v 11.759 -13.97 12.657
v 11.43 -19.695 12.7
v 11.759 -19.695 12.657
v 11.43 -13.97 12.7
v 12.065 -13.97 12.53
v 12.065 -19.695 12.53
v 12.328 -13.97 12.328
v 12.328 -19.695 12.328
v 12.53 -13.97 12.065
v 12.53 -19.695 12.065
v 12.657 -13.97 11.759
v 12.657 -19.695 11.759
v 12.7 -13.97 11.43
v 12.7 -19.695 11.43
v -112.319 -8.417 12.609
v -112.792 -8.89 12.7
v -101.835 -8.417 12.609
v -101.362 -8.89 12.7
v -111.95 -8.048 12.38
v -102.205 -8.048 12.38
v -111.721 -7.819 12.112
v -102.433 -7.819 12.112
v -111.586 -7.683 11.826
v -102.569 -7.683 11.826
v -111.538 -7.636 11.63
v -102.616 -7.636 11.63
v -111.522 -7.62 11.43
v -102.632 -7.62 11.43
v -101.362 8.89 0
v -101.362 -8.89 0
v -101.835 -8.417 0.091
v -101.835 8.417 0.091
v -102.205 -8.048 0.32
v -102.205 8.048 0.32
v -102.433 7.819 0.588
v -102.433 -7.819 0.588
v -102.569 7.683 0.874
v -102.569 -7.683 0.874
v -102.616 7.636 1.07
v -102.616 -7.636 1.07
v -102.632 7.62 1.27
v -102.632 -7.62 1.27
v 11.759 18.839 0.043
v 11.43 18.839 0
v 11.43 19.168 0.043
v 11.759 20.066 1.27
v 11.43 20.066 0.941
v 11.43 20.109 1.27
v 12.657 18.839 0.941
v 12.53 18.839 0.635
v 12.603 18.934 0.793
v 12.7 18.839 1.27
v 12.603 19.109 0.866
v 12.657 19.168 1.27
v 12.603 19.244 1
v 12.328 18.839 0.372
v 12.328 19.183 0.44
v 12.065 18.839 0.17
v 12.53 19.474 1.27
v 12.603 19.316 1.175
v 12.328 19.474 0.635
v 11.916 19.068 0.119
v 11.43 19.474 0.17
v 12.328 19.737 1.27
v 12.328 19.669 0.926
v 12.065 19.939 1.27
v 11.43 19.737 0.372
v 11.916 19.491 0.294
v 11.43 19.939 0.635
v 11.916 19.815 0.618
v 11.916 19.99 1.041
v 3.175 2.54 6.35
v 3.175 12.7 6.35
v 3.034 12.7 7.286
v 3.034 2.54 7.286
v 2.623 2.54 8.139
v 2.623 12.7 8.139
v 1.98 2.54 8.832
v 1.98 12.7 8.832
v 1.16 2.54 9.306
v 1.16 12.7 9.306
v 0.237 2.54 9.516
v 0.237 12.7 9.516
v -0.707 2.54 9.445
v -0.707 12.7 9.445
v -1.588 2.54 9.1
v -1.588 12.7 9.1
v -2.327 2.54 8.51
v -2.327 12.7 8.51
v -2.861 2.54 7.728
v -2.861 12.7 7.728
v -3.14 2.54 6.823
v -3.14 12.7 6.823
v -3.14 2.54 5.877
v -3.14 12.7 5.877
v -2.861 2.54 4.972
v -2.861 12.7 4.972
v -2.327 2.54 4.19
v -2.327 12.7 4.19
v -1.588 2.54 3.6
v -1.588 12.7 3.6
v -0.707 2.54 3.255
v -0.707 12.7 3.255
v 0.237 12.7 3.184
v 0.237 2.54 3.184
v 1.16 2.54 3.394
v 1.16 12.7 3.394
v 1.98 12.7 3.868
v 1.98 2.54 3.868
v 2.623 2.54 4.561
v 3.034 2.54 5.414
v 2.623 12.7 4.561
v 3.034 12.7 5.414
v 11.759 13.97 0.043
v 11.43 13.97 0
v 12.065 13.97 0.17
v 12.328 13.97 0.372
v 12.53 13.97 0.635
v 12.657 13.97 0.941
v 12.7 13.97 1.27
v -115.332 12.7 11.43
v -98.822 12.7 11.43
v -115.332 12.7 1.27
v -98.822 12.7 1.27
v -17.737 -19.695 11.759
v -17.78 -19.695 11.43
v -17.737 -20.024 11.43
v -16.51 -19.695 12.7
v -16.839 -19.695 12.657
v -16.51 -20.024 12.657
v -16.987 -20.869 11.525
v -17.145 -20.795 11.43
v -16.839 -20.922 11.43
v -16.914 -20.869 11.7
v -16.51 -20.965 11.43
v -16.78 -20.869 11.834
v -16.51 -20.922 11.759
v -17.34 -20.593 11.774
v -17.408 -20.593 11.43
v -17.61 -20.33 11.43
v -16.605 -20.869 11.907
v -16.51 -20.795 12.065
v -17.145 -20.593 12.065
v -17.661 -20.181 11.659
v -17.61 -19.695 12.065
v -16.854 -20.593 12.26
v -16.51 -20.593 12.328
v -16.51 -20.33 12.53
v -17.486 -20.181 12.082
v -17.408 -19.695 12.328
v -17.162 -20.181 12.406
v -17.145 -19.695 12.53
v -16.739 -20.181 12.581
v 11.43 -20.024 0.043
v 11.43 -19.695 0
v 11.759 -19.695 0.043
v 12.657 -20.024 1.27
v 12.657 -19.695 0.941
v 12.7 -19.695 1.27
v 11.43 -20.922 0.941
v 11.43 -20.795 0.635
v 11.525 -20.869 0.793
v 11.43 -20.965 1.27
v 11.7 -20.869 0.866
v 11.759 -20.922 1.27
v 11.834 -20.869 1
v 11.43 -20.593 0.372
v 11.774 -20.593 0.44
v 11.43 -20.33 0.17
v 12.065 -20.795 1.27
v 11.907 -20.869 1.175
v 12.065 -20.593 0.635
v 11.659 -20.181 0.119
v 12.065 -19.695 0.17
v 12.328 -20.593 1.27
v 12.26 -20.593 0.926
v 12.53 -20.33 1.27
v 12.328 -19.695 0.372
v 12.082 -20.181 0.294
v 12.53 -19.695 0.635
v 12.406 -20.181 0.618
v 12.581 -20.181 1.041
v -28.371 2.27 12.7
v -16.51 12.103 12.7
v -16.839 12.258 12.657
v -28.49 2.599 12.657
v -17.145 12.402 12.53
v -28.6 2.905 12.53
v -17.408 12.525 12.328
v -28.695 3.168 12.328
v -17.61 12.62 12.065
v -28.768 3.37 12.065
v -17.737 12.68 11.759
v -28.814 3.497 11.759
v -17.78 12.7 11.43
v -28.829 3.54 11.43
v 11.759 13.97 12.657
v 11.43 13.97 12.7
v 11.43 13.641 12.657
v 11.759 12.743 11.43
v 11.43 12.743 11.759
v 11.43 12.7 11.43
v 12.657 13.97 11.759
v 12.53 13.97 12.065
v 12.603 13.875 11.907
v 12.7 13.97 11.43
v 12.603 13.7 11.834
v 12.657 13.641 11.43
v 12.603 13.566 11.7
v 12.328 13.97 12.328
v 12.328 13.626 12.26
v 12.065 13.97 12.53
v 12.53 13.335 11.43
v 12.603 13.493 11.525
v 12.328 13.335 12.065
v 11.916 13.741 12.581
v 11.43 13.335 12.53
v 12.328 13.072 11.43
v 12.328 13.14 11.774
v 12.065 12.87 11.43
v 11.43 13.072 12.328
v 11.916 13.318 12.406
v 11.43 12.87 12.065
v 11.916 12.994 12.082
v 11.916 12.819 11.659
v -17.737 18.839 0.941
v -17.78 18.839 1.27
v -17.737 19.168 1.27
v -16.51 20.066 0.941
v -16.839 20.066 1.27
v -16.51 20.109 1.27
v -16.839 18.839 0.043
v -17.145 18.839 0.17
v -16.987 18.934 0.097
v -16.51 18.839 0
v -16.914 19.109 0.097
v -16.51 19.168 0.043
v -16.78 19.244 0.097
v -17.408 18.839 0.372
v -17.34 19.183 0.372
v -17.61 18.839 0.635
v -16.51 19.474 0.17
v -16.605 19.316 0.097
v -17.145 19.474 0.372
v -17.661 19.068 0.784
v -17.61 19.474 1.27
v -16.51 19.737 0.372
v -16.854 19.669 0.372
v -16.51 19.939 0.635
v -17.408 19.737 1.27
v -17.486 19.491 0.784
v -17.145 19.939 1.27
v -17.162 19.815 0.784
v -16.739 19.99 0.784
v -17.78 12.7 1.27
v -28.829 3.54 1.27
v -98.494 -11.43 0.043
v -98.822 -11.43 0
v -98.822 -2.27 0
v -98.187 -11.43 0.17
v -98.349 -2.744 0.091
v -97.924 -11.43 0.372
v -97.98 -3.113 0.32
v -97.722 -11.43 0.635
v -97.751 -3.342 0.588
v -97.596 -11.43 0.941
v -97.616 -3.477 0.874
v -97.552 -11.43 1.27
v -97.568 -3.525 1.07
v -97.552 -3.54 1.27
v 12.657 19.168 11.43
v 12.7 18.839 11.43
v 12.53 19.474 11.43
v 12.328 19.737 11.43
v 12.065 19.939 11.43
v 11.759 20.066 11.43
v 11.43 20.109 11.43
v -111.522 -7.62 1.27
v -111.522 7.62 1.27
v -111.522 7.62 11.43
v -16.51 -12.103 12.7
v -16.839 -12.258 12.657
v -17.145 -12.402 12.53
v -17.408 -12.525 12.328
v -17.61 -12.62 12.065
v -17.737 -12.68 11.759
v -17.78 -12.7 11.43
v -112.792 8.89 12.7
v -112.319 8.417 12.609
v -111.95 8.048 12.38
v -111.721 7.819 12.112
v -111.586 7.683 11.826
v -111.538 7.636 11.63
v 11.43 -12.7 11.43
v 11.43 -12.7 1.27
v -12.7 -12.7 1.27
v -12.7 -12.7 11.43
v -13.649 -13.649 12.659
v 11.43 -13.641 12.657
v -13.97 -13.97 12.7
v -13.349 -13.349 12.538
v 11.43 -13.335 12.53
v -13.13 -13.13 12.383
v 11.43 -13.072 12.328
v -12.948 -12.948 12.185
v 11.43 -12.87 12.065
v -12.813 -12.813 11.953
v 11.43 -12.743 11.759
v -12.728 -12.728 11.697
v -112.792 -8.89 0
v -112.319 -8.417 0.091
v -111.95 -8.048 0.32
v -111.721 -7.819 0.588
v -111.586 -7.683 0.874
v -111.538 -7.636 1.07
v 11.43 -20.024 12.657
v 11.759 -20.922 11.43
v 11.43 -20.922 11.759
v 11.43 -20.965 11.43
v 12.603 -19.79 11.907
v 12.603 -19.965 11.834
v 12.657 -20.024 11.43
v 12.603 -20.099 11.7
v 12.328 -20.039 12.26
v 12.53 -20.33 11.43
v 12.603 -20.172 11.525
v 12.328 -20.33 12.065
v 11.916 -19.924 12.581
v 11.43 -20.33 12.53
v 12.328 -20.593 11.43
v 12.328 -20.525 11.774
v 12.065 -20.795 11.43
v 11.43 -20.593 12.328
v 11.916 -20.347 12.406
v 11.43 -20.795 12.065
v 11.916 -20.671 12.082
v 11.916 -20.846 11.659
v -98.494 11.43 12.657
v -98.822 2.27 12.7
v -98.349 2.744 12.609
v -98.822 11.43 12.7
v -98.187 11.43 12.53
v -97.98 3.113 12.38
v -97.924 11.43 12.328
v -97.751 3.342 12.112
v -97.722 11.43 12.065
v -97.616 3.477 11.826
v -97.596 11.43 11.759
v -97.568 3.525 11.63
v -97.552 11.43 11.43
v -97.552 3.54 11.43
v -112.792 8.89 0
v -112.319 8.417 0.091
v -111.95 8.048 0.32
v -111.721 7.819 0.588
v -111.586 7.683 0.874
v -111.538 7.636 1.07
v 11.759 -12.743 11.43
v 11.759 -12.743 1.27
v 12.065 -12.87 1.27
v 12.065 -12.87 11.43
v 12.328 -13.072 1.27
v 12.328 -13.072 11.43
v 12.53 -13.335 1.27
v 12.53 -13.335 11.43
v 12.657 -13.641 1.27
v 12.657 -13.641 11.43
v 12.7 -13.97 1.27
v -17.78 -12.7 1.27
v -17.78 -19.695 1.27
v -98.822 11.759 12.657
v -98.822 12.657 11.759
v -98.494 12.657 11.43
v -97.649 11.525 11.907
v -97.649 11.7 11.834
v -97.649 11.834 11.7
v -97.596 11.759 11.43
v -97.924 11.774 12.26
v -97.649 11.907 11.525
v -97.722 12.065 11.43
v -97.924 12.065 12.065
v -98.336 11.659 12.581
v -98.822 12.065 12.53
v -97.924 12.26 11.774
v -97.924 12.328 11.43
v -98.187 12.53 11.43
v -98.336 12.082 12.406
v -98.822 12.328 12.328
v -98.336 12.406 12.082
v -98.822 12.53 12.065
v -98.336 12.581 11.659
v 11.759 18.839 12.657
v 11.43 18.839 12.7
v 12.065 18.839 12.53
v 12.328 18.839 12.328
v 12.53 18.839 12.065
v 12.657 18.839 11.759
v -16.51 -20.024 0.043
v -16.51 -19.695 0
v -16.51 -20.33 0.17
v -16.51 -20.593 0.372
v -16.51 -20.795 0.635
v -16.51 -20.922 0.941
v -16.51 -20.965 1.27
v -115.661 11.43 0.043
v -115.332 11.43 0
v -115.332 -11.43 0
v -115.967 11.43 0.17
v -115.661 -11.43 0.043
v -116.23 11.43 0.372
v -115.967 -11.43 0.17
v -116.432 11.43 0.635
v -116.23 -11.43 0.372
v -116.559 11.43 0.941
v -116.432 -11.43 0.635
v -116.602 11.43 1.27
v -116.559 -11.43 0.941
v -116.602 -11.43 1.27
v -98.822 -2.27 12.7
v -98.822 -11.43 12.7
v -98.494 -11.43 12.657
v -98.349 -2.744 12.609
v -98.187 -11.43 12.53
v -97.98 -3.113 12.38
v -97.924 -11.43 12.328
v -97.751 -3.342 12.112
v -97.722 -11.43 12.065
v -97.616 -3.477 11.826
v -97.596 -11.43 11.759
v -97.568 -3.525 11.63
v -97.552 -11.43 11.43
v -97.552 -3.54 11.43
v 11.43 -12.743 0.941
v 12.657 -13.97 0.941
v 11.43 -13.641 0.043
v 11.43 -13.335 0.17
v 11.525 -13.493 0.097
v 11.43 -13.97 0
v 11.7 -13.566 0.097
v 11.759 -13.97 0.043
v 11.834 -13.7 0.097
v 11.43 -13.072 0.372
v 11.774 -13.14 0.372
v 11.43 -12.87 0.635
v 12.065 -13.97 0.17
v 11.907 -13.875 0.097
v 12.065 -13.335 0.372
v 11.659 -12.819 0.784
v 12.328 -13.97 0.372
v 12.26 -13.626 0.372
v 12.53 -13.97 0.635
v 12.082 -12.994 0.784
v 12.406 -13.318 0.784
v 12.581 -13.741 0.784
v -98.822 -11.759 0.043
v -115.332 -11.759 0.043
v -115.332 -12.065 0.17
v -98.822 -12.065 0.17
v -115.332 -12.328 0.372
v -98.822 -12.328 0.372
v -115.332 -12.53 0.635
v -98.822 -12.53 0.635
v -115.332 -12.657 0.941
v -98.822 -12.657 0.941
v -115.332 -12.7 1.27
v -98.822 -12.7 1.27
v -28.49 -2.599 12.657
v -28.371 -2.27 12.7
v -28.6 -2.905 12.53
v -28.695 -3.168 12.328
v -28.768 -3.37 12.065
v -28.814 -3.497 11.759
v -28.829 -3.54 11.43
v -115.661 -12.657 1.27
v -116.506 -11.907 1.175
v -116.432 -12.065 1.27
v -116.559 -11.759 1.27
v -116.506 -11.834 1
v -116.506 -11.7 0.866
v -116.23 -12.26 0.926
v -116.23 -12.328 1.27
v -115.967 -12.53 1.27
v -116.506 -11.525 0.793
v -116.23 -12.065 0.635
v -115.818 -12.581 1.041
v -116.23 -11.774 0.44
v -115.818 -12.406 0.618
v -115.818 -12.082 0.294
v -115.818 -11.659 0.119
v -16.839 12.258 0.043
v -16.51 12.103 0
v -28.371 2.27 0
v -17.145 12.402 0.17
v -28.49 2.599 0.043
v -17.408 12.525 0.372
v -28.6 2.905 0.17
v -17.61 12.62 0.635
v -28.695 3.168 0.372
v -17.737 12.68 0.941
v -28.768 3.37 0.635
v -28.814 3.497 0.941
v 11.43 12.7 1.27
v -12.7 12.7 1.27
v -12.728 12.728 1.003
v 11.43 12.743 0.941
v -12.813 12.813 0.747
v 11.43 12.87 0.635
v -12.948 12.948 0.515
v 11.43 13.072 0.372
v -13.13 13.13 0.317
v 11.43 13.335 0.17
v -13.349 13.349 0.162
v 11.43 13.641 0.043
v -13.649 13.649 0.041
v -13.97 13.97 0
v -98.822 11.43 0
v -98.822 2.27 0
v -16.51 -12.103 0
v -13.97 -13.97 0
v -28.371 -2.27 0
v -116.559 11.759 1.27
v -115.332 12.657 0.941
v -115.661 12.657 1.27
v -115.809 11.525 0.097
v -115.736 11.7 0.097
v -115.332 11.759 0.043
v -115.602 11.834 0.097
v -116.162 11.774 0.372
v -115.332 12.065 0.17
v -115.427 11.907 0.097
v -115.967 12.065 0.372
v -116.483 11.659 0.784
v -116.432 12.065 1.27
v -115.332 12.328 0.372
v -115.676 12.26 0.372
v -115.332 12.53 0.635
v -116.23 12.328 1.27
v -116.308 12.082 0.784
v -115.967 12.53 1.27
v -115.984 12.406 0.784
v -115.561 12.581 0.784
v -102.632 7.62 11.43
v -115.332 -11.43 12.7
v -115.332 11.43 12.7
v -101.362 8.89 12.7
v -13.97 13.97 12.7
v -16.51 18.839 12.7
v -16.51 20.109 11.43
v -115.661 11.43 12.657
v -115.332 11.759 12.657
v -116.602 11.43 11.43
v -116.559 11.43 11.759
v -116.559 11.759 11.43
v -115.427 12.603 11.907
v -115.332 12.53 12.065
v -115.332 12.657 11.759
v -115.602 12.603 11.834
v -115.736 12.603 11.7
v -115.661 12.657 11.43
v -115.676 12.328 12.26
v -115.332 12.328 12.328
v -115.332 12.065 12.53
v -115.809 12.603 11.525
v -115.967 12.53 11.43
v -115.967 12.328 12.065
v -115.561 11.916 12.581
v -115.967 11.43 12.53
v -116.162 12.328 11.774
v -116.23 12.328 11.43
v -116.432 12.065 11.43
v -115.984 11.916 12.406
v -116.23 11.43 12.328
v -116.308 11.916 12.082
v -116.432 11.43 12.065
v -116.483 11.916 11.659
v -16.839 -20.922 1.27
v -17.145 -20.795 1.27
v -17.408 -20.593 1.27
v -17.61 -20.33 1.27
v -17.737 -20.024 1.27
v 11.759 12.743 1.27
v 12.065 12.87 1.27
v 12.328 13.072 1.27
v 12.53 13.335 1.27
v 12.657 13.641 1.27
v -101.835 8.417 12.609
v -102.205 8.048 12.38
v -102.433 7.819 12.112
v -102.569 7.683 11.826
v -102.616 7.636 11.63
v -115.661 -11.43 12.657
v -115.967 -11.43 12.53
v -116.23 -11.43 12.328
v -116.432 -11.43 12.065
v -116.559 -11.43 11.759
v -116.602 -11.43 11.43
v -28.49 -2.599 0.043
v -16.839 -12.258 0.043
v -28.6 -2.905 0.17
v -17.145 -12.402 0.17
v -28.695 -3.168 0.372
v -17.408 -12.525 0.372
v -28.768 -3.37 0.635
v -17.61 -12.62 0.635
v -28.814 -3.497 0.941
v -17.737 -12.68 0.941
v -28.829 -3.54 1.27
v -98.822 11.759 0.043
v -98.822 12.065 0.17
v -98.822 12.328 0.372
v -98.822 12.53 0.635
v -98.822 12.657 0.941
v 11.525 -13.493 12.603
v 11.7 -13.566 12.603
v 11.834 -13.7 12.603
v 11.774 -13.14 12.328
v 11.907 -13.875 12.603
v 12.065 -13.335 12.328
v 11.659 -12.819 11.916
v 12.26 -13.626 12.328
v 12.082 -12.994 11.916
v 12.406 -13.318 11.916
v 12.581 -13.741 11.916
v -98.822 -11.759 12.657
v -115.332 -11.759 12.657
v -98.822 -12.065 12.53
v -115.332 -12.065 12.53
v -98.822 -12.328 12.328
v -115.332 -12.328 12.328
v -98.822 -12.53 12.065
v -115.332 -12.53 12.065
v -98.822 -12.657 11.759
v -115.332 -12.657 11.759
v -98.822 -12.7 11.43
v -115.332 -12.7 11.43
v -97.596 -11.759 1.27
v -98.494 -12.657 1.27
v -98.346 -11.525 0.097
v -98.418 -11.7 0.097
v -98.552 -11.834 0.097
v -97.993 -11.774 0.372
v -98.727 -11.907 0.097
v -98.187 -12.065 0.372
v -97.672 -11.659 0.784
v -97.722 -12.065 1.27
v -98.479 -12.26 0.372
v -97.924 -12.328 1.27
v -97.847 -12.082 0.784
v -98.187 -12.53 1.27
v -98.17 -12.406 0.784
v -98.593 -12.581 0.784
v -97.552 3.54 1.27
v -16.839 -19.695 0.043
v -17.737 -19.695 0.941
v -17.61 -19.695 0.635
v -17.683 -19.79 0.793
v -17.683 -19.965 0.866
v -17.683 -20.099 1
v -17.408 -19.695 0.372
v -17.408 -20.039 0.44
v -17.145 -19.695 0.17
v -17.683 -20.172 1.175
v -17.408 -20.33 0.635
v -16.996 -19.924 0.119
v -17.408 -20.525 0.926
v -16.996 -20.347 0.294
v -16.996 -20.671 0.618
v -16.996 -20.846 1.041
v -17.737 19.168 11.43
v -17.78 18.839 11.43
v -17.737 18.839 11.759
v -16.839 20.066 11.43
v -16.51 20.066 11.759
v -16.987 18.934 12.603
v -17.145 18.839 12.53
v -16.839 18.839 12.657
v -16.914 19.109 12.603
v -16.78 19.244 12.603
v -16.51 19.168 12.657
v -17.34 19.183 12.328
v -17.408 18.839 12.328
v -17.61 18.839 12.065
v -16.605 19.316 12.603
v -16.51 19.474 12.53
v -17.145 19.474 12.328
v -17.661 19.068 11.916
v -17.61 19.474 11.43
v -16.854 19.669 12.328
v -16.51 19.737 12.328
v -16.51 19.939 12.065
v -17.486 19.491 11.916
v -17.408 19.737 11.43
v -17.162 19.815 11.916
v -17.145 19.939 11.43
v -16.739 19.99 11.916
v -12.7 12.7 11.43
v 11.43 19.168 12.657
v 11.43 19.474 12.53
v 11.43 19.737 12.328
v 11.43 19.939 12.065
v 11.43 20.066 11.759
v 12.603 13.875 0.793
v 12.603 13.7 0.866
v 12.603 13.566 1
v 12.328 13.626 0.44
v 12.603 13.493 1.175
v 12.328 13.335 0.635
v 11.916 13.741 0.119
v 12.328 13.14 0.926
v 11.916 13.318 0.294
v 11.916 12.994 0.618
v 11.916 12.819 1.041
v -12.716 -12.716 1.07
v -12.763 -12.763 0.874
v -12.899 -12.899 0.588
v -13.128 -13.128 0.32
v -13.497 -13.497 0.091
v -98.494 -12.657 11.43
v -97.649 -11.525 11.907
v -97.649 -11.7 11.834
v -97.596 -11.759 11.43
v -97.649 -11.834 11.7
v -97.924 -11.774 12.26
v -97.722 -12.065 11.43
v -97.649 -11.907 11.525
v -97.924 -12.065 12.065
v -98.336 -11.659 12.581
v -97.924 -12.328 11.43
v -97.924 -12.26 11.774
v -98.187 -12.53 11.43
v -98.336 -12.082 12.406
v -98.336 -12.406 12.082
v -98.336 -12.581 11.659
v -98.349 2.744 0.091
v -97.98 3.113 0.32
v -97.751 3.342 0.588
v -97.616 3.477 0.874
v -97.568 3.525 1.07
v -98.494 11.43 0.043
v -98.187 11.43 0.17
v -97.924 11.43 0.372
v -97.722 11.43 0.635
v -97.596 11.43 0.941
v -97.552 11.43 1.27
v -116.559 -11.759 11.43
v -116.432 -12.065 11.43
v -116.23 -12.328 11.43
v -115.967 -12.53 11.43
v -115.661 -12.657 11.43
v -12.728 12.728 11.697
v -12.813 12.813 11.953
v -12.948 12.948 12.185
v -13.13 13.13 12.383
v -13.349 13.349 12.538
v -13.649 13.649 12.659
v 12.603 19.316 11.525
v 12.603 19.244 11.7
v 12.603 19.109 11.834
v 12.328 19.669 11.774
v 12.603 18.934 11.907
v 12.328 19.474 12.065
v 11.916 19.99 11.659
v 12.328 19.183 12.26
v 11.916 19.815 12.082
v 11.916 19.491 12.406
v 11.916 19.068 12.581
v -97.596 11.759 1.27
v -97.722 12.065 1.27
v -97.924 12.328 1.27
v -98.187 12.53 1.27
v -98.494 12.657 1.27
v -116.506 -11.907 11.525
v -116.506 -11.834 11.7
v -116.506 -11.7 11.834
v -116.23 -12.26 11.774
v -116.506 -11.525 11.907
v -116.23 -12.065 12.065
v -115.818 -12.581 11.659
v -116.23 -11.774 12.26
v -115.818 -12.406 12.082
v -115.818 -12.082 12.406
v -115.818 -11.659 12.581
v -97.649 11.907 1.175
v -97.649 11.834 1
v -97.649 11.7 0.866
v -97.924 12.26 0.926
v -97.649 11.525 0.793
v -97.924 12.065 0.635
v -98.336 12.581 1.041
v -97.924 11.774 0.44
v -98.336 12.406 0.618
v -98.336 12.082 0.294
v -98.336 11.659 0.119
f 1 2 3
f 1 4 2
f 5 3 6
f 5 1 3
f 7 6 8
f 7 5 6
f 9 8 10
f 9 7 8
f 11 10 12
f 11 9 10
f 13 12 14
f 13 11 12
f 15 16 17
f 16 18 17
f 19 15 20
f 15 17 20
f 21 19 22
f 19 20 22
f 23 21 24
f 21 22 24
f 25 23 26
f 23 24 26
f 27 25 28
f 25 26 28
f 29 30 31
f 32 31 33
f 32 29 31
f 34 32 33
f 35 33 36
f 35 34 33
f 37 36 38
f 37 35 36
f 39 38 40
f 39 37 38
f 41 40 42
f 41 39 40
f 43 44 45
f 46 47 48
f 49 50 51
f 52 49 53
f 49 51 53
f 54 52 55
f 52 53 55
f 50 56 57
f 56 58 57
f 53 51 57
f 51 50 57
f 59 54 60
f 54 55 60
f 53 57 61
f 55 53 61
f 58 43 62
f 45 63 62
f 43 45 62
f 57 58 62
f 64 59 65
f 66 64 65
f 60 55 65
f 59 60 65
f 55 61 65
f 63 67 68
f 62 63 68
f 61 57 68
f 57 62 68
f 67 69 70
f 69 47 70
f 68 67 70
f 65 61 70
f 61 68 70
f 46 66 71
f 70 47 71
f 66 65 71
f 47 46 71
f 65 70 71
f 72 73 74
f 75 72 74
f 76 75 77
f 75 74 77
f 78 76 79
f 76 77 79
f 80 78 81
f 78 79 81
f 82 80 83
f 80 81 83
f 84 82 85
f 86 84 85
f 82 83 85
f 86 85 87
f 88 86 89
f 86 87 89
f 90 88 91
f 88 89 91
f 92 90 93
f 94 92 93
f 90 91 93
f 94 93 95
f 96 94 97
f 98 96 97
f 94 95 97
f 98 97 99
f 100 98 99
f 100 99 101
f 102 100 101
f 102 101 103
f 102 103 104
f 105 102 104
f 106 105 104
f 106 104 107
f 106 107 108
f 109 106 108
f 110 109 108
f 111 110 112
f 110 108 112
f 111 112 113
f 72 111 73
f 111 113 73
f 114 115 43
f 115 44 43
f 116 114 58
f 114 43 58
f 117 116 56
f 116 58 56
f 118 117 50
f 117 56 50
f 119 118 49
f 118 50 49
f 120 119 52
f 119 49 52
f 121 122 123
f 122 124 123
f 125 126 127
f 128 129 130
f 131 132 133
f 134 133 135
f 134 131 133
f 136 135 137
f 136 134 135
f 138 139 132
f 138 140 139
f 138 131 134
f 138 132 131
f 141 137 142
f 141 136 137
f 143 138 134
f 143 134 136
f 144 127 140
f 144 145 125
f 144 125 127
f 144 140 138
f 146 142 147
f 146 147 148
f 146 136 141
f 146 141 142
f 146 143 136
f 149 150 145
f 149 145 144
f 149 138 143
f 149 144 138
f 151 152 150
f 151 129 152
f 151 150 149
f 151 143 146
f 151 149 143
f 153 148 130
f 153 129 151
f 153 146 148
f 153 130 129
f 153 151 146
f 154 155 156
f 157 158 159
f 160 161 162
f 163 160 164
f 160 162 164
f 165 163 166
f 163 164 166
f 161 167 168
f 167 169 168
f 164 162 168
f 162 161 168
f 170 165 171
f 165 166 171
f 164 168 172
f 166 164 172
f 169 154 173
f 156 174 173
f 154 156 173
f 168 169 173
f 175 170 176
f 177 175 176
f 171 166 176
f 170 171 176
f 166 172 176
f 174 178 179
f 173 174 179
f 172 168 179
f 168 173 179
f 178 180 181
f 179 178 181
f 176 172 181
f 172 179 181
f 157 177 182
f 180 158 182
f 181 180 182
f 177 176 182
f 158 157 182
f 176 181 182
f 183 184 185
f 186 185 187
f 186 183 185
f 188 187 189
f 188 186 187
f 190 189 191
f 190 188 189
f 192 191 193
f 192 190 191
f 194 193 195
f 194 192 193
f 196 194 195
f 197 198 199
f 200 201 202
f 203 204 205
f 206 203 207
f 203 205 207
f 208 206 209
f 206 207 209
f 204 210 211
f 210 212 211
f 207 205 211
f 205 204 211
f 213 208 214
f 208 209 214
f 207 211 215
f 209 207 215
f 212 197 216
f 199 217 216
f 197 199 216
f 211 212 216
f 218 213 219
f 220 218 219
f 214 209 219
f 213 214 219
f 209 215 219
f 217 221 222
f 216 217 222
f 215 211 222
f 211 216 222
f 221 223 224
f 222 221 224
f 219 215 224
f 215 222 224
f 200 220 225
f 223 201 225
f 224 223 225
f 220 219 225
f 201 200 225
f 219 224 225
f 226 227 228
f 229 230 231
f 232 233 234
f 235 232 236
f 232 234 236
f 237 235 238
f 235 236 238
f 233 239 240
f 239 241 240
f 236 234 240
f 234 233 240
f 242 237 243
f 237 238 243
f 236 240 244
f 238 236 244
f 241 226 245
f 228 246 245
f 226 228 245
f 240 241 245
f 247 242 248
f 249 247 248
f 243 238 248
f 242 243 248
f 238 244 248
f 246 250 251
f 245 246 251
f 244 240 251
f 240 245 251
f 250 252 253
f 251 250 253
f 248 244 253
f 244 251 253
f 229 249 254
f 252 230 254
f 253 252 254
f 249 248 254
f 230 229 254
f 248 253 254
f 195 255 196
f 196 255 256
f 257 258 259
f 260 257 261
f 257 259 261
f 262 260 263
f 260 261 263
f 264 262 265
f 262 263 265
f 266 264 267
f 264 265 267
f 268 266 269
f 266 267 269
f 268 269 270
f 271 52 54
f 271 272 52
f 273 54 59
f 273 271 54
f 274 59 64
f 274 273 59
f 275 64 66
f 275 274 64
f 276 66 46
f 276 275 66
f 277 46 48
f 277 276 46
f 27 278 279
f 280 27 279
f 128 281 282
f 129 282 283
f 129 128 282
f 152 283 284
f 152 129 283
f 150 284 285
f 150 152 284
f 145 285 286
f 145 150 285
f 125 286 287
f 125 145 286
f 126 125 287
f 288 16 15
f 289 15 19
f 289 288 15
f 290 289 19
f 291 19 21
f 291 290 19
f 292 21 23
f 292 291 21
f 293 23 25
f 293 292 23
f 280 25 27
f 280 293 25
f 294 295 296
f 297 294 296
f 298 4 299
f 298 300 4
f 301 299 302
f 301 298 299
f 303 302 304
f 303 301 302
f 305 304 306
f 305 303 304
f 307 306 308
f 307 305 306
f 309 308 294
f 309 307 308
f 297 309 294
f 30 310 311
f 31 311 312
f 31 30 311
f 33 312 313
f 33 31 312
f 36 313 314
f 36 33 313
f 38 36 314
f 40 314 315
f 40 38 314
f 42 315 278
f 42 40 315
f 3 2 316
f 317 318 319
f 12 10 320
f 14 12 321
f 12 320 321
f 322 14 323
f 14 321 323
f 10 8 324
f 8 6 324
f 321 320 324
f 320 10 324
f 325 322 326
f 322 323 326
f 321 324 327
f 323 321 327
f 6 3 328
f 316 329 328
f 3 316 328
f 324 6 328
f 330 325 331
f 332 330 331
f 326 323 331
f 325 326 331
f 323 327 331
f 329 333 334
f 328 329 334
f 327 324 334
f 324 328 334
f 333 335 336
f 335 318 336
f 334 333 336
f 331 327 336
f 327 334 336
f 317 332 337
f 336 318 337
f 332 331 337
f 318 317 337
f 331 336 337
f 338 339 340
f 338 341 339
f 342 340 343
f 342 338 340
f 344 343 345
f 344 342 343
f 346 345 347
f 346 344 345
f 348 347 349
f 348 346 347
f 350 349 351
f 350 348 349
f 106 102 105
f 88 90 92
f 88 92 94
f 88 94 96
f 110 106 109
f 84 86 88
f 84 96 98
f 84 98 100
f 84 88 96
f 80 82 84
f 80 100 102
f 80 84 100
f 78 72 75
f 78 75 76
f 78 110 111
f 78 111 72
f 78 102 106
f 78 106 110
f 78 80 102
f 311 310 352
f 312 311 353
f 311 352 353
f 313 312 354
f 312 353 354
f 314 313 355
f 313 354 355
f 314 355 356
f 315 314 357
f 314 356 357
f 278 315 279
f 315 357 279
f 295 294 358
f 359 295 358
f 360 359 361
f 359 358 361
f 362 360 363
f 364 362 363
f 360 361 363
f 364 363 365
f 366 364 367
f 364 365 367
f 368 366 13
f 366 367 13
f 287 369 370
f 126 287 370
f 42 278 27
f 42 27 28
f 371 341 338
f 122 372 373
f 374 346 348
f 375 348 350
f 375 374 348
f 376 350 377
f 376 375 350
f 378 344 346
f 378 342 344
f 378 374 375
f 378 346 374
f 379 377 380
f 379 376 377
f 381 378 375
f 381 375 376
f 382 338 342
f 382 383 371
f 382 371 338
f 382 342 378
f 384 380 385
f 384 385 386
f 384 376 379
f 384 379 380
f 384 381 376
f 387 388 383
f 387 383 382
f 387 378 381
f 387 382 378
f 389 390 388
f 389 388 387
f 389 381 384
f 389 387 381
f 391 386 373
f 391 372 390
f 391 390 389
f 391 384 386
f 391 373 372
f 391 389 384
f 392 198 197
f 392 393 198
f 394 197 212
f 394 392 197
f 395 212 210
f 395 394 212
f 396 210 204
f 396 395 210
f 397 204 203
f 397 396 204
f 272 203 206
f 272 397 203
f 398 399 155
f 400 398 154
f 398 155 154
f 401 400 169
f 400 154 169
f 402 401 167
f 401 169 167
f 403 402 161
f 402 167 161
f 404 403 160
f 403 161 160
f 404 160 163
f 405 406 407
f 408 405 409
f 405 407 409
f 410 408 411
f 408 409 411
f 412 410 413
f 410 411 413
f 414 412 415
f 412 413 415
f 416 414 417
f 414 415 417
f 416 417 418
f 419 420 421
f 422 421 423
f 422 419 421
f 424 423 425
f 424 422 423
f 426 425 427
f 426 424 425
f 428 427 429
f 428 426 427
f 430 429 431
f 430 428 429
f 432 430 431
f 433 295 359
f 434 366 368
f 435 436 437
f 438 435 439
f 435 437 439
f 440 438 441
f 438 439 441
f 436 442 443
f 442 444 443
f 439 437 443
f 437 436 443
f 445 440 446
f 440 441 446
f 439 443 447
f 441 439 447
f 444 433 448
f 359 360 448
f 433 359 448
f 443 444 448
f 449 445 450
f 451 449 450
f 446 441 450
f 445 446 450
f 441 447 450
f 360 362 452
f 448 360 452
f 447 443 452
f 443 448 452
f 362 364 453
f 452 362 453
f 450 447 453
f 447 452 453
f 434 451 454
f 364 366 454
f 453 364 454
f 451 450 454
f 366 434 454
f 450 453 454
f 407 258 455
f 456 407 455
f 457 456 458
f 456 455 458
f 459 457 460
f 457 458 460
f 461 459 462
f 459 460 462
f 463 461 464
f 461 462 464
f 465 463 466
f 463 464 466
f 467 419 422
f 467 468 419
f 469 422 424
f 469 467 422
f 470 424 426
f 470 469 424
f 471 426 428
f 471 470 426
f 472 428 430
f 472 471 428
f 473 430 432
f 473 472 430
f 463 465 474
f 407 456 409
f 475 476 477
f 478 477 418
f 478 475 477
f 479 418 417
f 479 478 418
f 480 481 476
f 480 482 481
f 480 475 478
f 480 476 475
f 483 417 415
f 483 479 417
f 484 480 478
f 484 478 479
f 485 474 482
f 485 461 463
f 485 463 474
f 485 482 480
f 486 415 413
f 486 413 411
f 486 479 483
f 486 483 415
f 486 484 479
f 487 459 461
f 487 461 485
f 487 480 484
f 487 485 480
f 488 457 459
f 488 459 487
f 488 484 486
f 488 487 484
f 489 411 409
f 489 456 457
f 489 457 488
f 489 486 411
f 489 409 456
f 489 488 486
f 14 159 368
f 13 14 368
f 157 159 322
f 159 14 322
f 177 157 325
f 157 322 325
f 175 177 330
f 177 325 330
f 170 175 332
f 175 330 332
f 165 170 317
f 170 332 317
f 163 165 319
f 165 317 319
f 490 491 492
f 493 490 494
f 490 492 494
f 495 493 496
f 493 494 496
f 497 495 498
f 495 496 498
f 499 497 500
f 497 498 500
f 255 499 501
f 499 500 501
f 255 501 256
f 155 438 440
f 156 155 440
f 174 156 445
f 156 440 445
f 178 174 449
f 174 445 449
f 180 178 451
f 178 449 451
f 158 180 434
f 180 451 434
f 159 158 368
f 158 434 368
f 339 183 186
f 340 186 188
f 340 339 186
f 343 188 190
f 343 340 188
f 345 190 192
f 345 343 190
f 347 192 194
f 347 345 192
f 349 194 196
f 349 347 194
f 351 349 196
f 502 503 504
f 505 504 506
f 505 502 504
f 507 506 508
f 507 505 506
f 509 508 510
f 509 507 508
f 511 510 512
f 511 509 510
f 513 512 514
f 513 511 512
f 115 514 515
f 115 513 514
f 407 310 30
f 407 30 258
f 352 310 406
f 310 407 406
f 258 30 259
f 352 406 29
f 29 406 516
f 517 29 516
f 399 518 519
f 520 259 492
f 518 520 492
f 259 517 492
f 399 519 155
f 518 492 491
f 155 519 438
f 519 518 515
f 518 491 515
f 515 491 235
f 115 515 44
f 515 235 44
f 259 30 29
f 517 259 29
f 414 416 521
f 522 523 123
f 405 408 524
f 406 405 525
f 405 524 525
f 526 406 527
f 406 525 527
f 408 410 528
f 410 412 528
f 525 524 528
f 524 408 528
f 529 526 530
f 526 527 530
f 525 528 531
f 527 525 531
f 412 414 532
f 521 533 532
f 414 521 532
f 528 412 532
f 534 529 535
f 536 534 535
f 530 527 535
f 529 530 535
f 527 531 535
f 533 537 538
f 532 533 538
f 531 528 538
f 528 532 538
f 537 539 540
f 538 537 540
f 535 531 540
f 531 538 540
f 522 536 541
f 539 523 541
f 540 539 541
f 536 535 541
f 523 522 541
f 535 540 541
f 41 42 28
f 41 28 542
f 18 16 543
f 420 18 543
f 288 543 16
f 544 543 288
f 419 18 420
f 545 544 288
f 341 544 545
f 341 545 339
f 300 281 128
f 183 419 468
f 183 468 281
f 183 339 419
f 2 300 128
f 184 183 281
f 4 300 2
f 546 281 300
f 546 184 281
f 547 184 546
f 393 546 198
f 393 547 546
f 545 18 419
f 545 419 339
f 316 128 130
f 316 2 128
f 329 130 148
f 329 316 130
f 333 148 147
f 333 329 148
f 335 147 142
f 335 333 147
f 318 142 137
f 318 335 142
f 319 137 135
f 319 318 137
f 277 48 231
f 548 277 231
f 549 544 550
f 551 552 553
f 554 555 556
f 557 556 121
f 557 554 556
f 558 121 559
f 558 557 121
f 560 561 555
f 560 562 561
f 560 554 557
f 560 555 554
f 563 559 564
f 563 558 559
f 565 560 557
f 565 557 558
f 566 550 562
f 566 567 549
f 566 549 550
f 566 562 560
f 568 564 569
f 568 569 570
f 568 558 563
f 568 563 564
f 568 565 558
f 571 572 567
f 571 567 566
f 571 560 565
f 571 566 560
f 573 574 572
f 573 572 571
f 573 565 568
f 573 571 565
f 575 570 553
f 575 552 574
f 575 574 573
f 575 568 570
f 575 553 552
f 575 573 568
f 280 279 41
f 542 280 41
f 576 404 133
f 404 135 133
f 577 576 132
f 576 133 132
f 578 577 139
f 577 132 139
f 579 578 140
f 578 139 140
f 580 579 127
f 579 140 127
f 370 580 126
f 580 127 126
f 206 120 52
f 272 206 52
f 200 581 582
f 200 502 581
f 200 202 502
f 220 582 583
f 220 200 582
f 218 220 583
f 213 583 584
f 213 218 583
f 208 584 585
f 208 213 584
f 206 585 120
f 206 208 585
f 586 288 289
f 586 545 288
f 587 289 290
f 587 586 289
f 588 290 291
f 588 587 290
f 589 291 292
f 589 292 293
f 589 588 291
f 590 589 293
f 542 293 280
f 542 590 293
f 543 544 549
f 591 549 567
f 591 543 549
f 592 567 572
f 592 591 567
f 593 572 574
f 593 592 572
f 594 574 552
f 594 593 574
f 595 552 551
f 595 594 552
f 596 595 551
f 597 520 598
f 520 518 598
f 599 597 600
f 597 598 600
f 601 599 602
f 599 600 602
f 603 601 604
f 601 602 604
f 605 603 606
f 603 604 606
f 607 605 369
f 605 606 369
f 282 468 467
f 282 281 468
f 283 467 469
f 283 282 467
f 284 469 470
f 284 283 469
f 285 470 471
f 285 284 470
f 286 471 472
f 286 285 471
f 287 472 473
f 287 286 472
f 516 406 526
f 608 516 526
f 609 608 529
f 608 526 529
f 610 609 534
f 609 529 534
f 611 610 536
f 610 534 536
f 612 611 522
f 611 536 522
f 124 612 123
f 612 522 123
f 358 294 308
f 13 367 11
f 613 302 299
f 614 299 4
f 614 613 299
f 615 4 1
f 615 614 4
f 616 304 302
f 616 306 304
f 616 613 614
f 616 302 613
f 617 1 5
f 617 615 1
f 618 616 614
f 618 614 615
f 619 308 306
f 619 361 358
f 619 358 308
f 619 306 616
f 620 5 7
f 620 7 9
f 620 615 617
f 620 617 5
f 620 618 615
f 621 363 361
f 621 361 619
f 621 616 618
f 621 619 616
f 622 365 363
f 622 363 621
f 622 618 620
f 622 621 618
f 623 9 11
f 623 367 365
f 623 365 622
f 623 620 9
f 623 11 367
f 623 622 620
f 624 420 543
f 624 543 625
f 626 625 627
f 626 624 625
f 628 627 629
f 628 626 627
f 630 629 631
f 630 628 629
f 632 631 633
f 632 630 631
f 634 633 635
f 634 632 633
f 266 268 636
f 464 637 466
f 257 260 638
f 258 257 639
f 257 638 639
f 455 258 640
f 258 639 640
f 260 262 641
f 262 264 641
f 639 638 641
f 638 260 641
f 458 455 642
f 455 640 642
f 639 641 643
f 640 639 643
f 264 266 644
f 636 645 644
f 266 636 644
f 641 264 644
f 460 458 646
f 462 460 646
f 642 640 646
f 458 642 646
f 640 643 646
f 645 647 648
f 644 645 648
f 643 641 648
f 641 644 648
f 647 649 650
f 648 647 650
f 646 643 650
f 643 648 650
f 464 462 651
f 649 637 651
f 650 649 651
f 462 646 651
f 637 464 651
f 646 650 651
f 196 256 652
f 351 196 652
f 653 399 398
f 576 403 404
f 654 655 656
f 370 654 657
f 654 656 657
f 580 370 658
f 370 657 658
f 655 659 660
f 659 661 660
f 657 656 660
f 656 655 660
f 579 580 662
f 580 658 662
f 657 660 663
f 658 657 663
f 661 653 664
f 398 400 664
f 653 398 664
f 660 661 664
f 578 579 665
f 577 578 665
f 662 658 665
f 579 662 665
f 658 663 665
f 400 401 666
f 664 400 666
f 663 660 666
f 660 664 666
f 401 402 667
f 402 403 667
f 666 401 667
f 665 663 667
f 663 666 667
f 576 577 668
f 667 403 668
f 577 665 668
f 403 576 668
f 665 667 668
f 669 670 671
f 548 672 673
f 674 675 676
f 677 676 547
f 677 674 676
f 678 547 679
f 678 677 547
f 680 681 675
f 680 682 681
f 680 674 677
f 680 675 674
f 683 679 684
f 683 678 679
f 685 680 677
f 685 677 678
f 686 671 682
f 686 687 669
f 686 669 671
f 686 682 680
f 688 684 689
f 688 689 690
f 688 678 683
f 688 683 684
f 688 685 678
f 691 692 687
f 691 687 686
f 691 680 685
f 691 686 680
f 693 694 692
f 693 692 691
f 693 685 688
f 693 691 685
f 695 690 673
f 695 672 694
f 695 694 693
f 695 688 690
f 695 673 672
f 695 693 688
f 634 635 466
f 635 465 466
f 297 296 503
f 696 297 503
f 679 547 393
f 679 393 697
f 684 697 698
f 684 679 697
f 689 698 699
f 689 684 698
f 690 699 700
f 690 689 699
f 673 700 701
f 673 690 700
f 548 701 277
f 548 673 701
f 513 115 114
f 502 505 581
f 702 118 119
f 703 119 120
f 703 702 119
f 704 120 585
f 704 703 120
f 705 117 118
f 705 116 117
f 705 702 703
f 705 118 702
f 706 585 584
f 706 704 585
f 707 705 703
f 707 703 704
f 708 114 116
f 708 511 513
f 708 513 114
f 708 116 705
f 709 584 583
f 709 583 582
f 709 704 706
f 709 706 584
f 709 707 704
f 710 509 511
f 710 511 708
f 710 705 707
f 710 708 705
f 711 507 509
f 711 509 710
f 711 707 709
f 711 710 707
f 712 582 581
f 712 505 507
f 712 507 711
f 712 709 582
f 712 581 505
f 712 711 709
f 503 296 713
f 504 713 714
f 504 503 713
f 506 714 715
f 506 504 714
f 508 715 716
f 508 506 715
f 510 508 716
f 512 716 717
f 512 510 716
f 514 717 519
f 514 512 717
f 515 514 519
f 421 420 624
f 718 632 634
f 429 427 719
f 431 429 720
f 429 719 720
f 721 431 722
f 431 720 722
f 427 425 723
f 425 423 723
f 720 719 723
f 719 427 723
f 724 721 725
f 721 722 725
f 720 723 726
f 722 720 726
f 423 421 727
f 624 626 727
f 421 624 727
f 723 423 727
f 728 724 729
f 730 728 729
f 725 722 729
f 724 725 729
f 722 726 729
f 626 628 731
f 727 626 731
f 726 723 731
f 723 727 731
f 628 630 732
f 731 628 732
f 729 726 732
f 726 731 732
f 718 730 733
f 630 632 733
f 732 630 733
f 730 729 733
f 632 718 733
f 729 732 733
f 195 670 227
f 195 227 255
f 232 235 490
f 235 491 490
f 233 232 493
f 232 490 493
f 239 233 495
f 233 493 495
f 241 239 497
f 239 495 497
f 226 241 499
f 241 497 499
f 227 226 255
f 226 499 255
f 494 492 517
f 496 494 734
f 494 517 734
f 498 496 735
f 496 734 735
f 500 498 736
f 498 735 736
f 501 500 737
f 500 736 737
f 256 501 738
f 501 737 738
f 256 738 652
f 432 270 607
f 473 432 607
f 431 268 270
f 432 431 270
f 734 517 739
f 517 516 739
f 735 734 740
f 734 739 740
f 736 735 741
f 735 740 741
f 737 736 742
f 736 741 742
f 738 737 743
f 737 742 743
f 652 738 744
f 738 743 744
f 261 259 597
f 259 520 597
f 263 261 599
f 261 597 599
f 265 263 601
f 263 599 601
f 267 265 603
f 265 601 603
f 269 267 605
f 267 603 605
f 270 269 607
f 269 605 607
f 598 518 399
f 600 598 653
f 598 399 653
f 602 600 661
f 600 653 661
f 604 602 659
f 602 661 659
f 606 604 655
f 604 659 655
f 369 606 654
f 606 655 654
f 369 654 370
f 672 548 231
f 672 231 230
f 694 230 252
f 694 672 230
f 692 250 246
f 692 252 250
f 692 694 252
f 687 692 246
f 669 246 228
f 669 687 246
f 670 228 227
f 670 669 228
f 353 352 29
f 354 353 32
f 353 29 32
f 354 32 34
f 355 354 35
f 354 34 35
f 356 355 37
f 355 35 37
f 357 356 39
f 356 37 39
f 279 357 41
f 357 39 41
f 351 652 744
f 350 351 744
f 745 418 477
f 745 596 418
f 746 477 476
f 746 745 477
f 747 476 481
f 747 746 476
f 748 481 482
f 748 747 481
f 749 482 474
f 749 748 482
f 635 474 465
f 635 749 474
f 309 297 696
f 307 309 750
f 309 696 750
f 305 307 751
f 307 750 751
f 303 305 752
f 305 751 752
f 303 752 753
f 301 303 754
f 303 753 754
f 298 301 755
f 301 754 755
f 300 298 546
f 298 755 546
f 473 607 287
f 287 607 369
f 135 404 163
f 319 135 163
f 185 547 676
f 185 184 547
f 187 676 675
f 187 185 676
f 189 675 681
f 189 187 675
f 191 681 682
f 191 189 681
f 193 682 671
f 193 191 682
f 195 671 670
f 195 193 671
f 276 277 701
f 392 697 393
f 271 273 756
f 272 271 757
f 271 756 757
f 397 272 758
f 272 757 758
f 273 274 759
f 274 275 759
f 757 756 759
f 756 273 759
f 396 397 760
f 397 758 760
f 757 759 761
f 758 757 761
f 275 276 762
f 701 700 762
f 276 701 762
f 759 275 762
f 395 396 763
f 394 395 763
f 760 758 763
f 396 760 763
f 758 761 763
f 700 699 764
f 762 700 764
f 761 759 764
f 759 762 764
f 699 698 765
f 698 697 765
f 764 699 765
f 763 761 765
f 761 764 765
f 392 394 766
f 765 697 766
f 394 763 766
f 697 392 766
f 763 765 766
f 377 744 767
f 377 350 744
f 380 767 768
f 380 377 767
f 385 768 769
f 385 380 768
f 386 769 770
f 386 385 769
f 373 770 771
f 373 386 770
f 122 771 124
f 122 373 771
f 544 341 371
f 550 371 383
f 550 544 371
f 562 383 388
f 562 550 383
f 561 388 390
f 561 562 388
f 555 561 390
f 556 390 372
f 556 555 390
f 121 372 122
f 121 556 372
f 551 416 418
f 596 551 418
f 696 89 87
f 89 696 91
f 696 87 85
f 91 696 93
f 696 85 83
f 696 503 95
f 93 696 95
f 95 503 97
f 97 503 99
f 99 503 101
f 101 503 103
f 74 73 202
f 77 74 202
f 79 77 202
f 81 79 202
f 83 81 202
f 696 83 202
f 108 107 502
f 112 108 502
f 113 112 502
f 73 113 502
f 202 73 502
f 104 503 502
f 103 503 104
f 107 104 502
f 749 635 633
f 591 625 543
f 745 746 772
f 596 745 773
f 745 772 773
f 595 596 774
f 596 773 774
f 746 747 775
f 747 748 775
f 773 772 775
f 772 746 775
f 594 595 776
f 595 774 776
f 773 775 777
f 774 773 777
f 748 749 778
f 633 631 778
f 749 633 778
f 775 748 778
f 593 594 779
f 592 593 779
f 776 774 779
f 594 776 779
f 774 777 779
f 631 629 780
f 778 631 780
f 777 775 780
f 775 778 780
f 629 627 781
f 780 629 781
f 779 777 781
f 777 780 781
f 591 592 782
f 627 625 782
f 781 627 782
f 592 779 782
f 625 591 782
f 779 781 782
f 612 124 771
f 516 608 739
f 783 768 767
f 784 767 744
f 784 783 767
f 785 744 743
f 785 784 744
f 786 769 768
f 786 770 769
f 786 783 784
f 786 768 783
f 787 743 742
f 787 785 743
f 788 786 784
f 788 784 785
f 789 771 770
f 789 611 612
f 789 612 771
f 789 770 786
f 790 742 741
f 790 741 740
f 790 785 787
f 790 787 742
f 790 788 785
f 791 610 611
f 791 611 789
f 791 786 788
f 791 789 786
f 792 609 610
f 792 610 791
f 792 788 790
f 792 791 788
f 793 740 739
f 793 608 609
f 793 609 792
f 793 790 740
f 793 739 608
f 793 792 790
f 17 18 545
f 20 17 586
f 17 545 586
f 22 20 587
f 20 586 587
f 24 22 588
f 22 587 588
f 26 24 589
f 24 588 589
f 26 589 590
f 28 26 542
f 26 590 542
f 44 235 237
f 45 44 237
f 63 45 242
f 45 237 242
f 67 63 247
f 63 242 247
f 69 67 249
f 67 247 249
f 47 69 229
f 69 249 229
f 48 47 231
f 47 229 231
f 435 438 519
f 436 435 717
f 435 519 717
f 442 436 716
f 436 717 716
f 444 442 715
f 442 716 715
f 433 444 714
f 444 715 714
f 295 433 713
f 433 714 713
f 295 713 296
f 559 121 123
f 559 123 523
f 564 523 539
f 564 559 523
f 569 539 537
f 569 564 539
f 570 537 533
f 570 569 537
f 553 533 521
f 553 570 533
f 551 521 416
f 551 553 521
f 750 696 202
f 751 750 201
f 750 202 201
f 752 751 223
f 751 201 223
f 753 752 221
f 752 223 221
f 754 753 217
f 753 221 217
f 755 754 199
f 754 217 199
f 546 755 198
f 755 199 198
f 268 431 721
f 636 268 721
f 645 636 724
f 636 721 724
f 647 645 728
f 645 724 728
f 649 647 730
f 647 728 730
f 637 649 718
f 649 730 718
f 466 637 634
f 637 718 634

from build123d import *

# Parameters (mm, degrees)
F0_W     = 8.89
F0_H     = 15.24
F1_DEPTH = 12.7
F2_R     = 3.175
F5_DEPTH = 10.16
F6_R     = 1.27


# Not quite as in the source:
# - the program builds the solid bodies; features that only make, move or delete a surface that nothing else refers to are left out


with BuildPart() as f1:
    # F0 (on Top) → F1 (new body)
    with BuildSketch(Plane.XY):
        Polygon((-12.7, 12.7), (12.7, 12.7), (12.7, 20.1094653457), (-17.78, 20.1094653457), (-17.78, 12.7), (-28.8291541207, 3.5404531619), (-97.5522994995, 3.5404531619), (-97.5522994995, 12.7), (-116.6022994995, 12.7), (-116.6022994995, -12.7), (-97.5522994995, -12.7), (-97.5522994995, -3.5404531619), (-28.8291541207, -3.5404531619), (-17.78, -12.7), (-17.78, -20.9651887417), (12.7, -20.9651887417), (12.7, -12.7), (-12.7, -12.7), align=None)
        with Locations((-107.0772994995, 0)):
            Rectangle(F0_W, F0_H, mode=Mode.SUBTRACT)
    extrude(amount=F1_DEPTH)

    # F2 (on face) → F5 (join)
    with BuildSketch(Plane.XZ.offset(-12.7)):
        with Locations((0, 6.35)):
            Circle(F2_R)
    extrude(amount=F5_DEPTH)

    # F6
    f6_edges = [f1.edges().sort_by_distance(p)[0] for p in [
        (-63.190727, -3.540453, 12.7),
        (-63.190727, 3.540453, 12.7),
        (-63.190727, -3.540453, 0),
        (-107.077299, -12.7, 12.7),
        (-97.552299, -8.120227, 12.7),
        (-97.552299, -12.7, 6.35),
        (-97.552299, -8.120227, 0),
        (-107.077299, -12.7, 0),
        (-116.602299, -12.7, 6.35),
        (-116.602299, 0, 12.7),
        (-107.077299, 12.7, 12.7),
        (-97.552299, 8.120227, 12.7),
        (-102.632299, 0, 12.7),
        (-107.077299, 7.62, 12.7),
        (-111.522299, 0, 12.7),
        (-107.077299, -7.62, 12.7),
        (-116.602299, 12.7, 6.35),
        (-116.602299, 0, 0),
        (-111.522299, 0, 0),
        (-107.077299, 7.62, 0),
        (-102.632299, 0, 0),
        (-107.077299, -7.62, 0),
        (-107.077299, 12.7, 0),
        (-97.552299, 12.7, 6.35),
        (-97.552299, 8.120227, 0),
        (-63.190727, 3.540453, 0),
        (-17.78, 20.109465, 6.35),
        (-23.304577, 8.120227, 12.7),
        (-23.304577, 8.120227, 0),
        (-17.78, 16.404733, 0),
        (-17.78, 16.404733, 12.7),
        (-2.54, 20.109465, 12.7),
        (-2.54, 20.109465, 0),
        (0, 12.7, 0),
        (12.7, 16.404733, 0),
        (12.7, 20.109465, 6.35),
        (12.7, -12.7, 6.35),
        (0, -12.7, 0),
        (12.7, -16.832594, 0),
        (-2.54, -20.965189, 0),
        (-17.78, -16.832594, 0),
        (-12.7, 0, 0),
        (-23.304577, -8.120227, 0),
        (-23.304577, -8.120227, 12.7),
        (-12.7, 0, 12.7),
        (0, 12.7, 12.7),
        (12.7, 16.404733, 12.7),
        (12.7, 12.7, 6.35),
        (-17.78, -16.832594, 12.7),
        (-17.78, -20.965189, 6.35),
        (-2.54, -20.965189, 12.7),
        (0, -12.7, 12.7),
        (12.7, -16.832594, 12.7),
        (12.7, -20.965189, 6.35),
    ]]
    fillet(f6_edges, radius=F6_R)


solid = f1.part
